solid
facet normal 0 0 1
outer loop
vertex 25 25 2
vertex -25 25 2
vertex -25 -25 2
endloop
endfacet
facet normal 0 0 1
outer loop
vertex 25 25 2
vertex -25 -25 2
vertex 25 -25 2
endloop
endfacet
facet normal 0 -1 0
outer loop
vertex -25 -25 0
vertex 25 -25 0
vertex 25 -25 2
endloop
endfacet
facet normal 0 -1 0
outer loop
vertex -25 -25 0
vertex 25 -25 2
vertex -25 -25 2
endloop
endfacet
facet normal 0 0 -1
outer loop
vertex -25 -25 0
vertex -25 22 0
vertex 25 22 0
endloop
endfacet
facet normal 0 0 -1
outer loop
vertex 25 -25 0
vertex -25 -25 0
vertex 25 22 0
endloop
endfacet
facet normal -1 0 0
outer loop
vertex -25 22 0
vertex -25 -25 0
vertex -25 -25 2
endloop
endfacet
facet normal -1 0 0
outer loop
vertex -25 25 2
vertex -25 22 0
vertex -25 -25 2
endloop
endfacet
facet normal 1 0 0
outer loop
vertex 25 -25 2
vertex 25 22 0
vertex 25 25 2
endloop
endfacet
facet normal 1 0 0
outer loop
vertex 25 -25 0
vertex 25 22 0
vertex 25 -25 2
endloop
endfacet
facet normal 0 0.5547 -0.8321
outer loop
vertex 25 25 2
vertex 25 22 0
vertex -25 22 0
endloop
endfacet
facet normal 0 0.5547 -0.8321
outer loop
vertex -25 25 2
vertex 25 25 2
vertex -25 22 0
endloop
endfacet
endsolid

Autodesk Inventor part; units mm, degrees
ref_plane "YZ Plane" through (0, 0, 0) normal (1, 0, 0) x (0, 1, 0)
ref_plane "XZ Plane" through (0, 0, 0) normal (0, 1, 0) x (-1, 0, 0)
ref_plane "XY Plane" through (0, 0, 0) normal (0, 0, 1) x (1, 0, 0)
sketch "Skizze1" plane through (0, 0, 0) normal (0, 0, 1) x (1, 0, 0)
  line L0 (-25, 25) -> (25, 25)
  line L1 (25, 25) -> (25, -25)
  line L2 (25, -25) -> (-25, -25)
  line L3 (-25, -25) -> (-25, 25)
  line L4 (-25, 25) -> (25, -25) construction
  line L5 (25, 25) -> (-25, -25) construction
  point P0 (0, 0)
  dimension "d0" = 50
  dimension "d1" = 50
extrude "Extrusion1" add sketch "Skizze1" along normal blind 2
chamfer "Fase1" distance 2 distance2 3 1 edges at (0, 25, 0) measured on face at (8.3333, 25, 0.6667)
properties part number "plate90"
